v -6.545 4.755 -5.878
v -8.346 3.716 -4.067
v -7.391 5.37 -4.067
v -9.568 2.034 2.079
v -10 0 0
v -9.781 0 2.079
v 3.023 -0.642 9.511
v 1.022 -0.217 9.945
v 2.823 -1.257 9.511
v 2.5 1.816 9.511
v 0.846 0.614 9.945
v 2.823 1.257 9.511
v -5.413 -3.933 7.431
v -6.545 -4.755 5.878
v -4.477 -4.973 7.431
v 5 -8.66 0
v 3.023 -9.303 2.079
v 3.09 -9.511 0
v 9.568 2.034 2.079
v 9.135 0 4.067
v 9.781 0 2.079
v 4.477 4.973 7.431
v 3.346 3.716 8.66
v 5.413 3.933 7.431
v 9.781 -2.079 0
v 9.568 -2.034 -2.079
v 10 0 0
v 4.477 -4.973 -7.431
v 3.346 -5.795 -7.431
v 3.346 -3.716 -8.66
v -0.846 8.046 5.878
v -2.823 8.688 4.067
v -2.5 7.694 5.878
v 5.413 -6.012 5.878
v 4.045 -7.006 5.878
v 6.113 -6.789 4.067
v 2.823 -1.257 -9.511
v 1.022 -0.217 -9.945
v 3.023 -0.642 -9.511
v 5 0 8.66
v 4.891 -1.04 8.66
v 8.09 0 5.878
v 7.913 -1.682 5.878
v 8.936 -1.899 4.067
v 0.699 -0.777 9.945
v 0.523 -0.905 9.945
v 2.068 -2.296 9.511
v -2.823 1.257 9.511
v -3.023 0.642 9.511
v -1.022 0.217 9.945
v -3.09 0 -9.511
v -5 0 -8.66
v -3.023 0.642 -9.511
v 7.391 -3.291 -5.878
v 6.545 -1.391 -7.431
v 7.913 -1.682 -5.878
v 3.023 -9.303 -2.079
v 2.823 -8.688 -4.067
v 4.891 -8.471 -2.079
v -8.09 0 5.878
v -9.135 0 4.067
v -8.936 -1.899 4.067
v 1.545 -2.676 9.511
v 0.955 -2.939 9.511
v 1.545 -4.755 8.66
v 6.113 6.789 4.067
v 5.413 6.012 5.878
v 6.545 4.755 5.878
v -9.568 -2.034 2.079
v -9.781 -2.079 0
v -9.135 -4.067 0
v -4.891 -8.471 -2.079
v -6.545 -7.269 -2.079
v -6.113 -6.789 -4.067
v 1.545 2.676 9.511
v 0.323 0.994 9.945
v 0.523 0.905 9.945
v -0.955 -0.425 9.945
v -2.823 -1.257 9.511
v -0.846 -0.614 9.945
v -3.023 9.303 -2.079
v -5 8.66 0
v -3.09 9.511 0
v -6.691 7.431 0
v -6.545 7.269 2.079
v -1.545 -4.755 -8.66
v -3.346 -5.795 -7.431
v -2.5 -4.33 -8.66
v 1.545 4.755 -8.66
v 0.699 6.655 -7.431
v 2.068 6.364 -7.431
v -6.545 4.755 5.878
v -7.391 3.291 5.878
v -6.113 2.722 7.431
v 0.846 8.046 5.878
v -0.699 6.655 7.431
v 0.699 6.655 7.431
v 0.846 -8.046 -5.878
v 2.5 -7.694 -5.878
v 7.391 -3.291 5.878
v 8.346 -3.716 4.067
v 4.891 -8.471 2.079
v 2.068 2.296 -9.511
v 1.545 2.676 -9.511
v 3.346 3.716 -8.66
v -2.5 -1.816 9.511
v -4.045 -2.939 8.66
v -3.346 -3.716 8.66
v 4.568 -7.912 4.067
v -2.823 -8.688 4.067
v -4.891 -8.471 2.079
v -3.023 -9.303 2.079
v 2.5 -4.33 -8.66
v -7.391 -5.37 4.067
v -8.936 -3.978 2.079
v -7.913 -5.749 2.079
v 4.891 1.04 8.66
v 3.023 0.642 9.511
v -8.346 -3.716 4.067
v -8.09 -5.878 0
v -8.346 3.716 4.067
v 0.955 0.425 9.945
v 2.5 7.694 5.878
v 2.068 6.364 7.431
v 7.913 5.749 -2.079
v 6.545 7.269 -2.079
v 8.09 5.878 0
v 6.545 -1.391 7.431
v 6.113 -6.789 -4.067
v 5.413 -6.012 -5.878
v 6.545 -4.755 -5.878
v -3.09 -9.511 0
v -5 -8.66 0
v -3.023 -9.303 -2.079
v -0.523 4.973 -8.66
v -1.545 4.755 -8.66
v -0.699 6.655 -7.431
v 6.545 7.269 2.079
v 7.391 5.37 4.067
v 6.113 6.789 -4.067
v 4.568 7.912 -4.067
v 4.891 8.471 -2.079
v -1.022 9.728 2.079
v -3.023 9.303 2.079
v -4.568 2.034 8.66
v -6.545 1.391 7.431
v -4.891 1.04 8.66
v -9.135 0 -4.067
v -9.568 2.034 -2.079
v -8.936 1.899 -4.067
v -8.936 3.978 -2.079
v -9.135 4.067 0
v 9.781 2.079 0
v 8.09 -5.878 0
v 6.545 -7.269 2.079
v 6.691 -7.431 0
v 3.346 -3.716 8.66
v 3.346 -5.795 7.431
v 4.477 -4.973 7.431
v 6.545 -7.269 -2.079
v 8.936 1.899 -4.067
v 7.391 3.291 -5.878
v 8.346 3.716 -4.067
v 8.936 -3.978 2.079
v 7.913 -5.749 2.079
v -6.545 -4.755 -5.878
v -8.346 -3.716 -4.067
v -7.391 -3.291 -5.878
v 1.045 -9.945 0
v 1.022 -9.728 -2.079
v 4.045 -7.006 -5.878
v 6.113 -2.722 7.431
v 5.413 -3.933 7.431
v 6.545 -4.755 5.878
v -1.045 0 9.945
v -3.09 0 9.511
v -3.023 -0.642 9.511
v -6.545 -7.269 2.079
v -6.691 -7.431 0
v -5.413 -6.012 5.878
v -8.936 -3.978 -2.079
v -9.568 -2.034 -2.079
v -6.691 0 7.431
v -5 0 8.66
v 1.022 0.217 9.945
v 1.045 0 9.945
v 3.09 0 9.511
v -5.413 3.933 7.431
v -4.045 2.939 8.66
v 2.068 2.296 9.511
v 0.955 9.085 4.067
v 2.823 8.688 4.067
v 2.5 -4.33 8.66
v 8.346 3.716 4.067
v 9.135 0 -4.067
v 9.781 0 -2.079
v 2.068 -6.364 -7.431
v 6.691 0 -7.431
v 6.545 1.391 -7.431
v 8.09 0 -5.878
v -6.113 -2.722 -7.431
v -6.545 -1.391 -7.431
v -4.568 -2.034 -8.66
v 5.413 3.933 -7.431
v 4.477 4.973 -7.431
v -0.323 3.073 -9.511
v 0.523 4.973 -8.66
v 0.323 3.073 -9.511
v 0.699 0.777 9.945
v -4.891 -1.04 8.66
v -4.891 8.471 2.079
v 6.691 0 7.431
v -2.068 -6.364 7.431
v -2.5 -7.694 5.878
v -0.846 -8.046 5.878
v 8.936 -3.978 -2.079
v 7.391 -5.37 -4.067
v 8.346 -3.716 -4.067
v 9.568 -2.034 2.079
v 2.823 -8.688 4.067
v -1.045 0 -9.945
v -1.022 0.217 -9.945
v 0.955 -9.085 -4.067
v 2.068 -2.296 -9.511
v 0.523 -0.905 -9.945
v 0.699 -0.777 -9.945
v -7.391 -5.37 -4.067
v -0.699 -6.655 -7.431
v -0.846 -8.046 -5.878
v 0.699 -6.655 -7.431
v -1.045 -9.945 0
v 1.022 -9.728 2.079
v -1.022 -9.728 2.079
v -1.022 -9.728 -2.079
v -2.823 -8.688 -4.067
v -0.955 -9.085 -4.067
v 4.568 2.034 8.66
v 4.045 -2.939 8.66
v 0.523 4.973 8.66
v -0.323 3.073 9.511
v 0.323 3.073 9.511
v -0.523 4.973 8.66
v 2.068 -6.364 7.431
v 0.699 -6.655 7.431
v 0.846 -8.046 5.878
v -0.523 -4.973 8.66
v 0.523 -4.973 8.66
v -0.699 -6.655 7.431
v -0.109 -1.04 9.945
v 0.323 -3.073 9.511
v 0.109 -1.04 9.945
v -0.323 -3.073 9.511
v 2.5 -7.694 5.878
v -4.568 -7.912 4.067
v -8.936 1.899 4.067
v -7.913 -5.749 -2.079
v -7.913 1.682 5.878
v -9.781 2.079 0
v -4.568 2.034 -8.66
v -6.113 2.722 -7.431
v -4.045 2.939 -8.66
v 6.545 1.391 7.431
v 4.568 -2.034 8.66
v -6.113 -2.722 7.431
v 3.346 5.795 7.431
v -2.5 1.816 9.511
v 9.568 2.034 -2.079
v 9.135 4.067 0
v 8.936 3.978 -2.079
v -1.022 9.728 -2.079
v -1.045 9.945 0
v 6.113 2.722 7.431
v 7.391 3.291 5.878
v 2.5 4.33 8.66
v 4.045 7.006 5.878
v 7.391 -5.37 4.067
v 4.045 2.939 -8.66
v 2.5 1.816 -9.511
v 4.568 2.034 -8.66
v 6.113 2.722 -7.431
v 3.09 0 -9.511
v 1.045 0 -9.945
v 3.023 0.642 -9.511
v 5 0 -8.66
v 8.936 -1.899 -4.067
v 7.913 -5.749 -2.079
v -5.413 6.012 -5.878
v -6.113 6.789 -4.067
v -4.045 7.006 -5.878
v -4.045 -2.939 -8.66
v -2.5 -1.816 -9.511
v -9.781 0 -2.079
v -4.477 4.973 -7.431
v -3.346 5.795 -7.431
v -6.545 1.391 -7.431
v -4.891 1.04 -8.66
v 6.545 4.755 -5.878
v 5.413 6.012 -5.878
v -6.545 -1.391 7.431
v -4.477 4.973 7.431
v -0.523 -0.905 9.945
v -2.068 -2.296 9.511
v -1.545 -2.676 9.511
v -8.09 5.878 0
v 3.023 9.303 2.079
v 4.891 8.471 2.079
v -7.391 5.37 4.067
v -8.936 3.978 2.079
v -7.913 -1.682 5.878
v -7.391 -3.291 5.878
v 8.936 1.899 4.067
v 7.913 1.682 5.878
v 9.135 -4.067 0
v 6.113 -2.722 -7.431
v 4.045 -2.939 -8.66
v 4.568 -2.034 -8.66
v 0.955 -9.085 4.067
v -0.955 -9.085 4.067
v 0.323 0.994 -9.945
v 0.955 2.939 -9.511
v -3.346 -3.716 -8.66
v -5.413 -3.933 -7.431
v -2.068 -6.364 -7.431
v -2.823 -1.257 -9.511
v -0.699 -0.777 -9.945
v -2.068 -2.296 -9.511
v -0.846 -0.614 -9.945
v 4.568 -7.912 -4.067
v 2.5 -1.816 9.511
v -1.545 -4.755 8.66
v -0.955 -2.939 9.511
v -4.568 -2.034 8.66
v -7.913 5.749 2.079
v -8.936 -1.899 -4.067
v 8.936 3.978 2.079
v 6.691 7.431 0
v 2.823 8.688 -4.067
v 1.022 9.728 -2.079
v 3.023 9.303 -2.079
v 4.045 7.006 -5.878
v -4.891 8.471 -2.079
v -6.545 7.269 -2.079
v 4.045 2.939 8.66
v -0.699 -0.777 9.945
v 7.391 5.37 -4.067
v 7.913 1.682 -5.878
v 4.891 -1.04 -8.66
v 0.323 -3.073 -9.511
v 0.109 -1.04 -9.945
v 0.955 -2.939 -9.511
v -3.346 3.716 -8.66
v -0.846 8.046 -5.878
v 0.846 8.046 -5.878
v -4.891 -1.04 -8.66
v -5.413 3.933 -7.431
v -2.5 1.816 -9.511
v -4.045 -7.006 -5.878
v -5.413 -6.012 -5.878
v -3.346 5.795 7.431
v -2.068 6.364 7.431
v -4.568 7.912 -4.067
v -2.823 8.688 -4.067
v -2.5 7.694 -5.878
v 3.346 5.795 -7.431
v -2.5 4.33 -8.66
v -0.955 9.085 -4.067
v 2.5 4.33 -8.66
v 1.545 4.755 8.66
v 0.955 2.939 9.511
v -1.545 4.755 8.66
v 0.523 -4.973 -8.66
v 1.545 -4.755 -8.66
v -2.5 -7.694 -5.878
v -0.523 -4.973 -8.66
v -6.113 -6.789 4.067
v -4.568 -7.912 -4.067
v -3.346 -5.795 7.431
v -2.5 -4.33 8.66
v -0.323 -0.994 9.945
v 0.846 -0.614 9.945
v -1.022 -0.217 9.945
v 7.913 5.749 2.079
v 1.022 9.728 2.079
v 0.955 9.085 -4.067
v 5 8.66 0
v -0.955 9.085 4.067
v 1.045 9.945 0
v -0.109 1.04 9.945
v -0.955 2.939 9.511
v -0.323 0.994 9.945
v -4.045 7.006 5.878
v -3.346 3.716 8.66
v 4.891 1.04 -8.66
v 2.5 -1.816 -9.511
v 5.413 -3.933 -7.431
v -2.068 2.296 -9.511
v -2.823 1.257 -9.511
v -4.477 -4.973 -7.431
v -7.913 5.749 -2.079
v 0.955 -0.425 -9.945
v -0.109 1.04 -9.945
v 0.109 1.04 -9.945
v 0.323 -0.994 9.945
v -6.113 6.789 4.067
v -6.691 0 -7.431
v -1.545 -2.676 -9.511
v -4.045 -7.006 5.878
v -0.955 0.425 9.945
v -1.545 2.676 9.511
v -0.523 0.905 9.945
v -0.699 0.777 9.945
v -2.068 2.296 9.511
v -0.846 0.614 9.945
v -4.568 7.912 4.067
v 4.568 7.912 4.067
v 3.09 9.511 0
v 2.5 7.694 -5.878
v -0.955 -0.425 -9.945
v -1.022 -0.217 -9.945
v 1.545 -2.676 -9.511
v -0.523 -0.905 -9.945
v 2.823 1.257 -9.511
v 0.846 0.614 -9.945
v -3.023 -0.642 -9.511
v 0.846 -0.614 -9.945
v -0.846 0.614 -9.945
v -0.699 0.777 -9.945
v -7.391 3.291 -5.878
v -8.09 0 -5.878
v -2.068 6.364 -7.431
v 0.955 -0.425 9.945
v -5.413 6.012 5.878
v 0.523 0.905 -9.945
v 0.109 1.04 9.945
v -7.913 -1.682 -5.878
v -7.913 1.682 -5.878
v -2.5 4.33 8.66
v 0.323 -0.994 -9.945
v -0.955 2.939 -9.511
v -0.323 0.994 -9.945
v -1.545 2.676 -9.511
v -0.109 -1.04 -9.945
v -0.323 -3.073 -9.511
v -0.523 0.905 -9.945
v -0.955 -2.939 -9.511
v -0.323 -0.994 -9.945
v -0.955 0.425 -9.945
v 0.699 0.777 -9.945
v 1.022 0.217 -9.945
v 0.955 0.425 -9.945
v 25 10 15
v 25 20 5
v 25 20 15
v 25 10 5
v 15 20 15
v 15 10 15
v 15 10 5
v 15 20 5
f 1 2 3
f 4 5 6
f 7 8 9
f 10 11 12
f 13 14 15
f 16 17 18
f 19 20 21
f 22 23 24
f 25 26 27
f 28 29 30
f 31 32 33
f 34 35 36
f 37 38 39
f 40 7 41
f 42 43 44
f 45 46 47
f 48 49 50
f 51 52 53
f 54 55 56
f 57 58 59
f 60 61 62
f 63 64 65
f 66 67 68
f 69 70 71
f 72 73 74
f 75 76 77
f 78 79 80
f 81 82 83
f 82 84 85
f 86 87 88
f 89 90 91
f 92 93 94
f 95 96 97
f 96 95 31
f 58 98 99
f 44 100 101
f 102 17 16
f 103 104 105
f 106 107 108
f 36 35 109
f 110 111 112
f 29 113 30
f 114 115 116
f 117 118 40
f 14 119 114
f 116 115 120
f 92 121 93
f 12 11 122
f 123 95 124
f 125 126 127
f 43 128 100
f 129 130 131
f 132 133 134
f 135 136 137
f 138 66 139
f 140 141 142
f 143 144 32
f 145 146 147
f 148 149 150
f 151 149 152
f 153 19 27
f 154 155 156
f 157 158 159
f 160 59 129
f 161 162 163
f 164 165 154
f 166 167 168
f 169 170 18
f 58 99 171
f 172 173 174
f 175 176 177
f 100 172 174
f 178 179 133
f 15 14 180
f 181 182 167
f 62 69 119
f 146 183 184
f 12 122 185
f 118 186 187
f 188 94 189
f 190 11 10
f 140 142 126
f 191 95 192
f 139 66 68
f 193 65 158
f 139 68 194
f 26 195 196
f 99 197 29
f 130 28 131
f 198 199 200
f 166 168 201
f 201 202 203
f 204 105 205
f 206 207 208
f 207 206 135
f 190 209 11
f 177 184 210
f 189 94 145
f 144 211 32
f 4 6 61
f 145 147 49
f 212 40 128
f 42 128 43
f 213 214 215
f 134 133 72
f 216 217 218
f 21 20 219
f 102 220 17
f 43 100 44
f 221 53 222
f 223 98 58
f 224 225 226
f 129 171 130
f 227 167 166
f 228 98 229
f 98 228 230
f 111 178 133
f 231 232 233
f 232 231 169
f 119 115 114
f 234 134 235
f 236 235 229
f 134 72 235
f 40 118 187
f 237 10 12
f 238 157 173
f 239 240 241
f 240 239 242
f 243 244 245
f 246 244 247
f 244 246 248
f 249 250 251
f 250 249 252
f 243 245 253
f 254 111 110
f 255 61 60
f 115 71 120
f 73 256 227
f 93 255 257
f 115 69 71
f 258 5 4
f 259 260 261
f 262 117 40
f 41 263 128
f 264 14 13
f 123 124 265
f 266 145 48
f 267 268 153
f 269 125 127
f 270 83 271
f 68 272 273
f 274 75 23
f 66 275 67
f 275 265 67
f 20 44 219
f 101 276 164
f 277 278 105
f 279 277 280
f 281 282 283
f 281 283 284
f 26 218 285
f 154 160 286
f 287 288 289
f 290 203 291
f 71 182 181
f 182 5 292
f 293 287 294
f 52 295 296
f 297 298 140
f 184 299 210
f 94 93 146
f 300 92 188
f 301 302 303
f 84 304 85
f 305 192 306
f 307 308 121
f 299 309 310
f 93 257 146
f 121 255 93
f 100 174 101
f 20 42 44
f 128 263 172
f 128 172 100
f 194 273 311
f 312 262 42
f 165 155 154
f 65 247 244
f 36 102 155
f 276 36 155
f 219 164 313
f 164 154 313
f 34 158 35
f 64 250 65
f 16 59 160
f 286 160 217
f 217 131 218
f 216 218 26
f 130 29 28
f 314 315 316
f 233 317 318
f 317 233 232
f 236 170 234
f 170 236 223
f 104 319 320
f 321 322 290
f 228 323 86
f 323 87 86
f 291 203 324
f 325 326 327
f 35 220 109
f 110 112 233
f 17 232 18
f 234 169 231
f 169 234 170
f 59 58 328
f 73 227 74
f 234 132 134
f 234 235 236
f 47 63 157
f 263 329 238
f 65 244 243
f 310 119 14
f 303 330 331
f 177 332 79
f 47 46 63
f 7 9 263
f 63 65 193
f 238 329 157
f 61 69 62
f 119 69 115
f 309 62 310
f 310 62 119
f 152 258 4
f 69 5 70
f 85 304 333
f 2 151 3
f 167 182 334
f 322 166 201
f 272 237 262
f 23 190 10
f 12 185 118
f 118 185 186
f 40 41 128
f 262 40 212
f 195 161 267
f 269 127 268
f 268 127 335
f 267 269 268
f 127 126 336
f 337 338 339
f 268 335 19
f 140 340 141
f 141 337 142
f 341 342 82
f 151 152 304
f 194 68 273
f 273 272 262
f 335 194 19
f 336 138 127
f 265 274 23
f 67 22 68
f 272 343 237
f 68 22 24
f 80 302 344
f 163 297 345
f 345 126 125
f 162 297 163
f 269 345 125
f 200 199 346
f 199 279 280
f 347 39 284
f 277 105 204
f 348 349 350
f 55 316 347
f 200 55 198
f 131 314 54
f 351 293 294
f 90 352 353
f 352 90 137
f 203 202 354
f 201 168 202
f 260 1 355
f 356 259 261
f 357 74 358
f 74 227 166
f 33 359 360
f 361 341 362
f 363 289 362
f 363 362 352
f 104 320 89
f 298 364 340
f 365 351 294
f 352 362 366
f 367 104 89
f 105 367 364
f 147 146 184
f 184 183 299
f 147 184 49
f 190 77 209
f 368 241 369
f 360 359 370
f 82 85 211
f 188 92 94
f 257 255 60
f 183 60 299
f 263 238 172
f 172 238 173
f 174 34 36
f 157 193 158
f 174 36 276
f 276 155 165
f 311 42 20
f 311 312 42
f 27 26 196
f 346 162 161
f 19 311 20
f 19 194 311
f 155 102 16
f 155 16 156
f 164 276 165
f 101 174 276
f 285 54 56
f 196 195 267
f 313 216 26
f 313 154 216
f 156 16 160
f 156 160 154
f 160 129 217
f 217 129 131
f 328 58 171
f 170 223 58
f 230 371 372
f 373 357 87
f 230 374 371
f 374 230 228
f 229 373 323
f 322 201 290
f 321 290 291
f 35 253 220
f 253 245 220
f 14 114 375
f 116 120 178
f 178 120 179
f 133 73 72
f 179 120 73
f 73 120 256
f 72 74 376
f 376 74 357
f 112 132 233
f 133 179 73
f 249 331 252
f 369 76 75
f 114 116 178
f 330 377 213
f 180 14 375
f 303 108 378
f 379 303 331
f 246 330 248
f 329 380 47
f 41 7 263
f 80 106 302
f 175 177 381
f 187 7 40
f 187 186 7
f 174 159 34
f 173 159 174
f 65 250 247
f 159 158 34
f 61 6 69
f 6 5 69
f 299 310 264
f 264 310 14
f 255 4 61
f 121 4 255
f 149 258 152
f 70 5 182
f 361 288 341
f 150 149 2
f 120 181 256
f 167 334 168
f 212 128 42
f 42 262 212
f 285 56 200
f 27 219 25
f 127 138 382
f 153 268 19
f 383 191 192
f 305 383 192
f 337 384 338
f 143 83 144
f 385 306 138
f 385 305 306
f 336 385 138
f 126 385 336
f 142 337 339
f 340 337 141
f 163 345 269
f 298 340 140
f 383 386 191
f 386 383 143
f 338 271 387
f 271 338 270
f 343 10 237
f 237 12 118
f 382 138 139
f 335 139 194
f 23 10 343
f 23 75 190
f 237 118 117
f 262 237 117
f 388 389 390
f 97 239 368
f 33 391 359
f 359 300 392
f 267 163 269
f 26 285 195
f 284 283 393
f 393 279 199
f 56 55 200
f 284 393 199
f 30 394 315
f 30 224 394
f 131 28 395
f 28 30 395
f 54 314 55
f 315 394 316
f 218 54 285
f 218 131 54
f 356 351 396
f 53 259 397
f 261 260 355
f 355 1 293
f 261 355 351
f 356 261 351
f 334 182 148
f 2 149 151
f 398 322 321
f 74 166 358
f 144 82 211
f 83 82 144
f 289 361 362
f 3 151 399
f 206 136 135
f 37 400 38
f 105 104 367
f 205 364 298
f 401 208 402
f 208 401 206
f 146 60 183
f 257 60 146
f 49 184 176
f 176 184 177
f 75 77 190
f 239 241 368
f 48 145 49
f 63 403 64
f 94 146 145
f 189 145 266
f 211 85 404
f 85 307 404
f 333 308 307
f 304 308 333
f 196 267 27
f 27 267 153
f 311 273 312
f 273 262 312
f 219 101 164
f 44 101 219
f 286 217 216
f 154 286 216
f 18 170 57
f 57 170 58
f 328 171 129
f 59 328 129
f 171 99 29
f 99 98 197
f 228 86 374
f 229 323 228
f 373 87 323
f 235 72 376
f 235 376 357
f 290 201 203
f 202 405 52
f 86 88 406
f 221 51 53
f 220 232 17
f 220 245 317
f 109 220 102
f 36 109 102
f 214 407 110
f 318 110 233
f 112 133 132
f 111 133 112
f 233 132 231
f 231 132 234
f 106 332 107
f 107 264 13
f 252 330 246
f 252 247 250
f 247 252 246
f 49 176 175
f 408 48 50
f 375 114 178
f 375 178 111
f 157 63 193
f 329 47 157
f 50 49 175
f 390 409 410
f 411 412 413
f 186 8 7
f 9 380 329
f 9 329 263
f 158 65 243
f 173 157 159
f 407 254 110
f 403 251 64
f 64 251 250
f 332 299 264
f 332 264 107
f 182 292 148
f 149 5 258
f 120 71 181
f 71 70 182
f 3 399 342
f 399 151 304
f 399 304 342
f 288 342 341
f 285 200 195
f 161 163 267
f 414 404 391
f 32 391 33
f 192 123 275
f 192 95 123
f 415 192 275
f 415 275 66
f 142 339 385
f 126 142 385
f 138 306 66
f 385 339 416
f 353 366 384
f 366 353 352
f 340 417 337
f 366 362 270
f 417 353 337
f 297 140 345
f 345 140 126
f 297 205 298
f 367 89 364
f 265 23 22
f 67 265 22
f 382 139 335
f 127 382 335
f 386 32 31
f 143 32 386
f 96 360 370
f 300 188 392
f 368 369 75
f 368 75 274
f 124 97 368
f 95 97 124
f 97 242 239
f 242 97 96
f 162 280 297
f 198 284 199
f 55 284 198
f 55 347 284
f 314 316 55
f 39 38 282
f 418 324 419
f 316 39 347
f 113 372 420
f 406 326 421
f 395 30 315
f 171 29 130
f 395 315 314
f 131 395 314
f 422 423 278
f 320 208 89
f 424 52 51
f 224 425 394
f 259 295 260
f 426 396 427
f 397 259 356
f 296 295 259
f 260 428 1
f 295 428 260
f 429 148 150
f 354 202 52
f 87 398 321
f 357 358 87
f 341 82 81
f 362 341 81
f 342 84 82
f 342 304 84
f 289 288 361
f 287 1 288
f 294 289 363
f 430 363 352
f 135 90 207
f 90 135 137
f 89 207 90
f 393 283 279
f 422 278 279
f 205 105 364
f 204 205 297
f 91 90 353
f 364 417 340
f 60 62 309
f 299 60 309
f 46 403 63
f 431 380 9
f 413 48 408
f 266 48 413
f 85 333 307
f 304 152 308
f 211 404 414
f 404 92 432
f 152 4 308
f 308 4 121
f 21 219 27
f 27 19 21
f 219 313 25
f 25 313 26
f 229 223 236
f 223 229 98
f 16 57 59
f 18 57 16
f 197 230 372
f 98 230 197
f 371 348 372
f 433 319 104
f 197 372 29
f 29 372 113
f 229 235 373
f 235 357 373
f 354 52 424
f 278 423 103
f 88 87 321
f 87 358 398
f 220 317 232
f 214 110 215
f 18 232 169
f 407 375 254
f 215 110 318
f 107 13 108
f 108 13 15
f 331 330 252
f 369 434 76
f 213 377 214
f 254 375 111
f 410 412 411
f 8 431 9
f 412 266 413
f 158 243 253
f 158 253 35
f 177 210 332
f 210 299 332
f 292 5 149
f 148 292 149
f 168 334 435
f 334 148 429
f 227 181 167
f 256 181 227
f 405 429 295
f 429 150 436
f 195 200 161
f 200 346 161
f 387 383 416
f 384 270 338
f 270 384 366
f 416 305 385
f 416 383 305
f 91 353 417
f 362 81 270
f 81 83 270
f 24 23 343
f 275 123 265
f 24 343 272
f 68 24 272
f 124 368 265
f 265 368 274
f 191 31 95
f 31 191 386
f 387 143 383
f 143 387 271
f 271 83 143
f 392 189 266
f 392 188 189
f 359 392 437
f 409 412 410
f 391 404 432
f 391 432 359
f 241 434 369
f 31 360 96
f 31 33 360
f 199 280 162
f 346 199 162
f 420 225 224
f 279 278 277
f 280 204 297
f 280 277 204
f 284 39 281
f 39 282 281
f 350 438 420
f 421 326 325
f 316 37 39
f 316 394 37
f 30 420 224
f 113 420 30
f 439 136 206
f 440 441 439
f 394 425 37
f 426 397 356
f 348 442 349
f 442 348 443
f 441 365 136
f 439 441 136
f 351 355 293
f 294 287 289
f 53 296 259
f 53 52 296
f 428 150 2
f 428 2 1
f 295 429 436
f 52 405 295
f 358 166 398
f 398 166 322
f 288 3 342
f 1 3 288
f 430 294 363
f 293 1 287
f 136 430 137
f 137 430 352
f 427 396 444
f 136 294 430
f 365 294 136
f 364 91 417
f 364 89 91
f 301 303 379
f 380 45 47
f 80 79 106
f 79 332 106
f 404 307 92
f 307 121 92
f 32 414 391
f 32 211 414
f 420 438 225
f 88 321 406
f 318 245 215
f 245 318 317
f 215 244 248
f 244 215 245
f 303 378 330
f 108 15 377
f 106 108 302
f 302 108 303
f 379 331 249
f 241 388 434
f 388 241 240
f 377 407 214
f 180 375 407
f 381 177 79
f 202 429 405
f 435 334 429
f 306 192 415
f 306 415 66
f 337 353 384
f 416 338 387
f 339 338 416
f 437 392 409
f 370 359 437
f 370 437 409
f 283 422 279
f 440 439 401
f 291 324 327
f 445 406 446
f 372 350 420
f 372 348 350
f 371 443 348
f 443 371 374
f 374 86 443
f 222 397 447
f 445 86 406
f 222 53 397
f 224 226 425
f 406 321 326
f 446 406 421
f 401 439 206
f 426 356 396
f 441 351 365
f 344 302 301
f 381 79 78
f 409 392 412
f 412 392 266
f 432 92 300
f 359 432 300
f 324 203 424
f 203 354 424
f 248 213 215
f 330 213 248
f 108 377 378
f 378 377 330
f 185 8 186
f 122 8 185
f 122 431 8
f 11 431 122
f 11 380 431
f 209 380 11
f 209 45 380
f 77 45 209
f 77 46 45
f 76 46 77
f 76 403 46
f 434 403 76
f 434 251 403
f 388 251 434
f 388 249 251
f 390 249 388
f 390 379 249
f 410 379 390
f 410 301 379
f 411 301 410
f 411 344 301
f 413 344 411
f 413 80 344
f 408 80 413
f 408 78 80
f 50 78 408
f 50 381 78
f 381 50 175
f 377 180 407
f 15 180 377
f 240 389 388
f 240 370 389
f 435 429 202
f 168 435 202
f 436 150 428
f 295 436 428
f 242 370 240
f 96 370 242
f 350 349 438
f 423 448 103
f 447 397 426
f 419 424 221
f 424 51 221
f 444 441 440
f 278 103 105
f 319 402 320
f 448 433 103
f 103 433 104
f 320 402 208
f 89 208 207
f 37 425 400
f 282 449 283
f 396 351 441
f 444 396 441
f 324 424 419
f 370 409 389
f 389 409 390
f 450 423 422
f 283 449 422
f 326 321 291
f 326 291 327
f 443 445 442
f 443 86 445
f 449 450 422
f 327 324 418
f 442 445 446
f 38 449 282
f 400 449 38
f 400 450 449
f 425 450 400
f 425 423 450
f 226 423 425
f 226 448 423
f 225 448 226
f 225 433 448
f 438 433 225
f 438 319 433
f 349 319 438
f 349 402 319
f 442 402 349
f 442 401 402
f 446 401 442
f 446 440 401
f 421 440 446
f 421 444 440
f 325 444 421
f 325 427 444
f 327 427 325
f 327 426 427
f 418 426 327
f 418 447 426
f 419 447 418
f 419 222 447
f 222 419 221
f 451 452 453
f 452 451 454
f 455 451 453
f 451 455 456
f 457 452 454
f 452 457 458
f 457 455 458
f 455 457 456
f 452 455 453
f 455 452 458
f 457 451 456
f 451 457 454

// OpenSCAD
module bbox() { 

    // a 3D approx. of the children projection on X axis 
    module xProjection() 
        translate([0,1/2,-1/2]) 
            linear_extrude(1) 
                hull() 
                    projection() 
                        rotate([90,0,0]) 
                            linear_extrude(1) 
                                projection() children(); 
  
    // a bounding box with an offset of 1 in all axis
    module bbx()  
        minkowski() { 
            xProjection() children(); // x axis
            rotate(-90)               // y axis
                xProjection() rotate(90) children(); 
            rotate([0,-90,0])         // z axis
                xProjection() rotate([0,90,0]) children(); 
        } 
    
    // offset children() (a cube) by -1 in all axis
    module shrink()
      intersection() {
        translate([ 1, 1, 1]) children();
        translate([-1,-1,-1]) children();
      }

   shrink() bbx() children(); 
}

module model()
  color("red") 
  union() {
    sphere(10);
    translate([15,10,5]) cube(10);
  }

model();
%bbox() model();
